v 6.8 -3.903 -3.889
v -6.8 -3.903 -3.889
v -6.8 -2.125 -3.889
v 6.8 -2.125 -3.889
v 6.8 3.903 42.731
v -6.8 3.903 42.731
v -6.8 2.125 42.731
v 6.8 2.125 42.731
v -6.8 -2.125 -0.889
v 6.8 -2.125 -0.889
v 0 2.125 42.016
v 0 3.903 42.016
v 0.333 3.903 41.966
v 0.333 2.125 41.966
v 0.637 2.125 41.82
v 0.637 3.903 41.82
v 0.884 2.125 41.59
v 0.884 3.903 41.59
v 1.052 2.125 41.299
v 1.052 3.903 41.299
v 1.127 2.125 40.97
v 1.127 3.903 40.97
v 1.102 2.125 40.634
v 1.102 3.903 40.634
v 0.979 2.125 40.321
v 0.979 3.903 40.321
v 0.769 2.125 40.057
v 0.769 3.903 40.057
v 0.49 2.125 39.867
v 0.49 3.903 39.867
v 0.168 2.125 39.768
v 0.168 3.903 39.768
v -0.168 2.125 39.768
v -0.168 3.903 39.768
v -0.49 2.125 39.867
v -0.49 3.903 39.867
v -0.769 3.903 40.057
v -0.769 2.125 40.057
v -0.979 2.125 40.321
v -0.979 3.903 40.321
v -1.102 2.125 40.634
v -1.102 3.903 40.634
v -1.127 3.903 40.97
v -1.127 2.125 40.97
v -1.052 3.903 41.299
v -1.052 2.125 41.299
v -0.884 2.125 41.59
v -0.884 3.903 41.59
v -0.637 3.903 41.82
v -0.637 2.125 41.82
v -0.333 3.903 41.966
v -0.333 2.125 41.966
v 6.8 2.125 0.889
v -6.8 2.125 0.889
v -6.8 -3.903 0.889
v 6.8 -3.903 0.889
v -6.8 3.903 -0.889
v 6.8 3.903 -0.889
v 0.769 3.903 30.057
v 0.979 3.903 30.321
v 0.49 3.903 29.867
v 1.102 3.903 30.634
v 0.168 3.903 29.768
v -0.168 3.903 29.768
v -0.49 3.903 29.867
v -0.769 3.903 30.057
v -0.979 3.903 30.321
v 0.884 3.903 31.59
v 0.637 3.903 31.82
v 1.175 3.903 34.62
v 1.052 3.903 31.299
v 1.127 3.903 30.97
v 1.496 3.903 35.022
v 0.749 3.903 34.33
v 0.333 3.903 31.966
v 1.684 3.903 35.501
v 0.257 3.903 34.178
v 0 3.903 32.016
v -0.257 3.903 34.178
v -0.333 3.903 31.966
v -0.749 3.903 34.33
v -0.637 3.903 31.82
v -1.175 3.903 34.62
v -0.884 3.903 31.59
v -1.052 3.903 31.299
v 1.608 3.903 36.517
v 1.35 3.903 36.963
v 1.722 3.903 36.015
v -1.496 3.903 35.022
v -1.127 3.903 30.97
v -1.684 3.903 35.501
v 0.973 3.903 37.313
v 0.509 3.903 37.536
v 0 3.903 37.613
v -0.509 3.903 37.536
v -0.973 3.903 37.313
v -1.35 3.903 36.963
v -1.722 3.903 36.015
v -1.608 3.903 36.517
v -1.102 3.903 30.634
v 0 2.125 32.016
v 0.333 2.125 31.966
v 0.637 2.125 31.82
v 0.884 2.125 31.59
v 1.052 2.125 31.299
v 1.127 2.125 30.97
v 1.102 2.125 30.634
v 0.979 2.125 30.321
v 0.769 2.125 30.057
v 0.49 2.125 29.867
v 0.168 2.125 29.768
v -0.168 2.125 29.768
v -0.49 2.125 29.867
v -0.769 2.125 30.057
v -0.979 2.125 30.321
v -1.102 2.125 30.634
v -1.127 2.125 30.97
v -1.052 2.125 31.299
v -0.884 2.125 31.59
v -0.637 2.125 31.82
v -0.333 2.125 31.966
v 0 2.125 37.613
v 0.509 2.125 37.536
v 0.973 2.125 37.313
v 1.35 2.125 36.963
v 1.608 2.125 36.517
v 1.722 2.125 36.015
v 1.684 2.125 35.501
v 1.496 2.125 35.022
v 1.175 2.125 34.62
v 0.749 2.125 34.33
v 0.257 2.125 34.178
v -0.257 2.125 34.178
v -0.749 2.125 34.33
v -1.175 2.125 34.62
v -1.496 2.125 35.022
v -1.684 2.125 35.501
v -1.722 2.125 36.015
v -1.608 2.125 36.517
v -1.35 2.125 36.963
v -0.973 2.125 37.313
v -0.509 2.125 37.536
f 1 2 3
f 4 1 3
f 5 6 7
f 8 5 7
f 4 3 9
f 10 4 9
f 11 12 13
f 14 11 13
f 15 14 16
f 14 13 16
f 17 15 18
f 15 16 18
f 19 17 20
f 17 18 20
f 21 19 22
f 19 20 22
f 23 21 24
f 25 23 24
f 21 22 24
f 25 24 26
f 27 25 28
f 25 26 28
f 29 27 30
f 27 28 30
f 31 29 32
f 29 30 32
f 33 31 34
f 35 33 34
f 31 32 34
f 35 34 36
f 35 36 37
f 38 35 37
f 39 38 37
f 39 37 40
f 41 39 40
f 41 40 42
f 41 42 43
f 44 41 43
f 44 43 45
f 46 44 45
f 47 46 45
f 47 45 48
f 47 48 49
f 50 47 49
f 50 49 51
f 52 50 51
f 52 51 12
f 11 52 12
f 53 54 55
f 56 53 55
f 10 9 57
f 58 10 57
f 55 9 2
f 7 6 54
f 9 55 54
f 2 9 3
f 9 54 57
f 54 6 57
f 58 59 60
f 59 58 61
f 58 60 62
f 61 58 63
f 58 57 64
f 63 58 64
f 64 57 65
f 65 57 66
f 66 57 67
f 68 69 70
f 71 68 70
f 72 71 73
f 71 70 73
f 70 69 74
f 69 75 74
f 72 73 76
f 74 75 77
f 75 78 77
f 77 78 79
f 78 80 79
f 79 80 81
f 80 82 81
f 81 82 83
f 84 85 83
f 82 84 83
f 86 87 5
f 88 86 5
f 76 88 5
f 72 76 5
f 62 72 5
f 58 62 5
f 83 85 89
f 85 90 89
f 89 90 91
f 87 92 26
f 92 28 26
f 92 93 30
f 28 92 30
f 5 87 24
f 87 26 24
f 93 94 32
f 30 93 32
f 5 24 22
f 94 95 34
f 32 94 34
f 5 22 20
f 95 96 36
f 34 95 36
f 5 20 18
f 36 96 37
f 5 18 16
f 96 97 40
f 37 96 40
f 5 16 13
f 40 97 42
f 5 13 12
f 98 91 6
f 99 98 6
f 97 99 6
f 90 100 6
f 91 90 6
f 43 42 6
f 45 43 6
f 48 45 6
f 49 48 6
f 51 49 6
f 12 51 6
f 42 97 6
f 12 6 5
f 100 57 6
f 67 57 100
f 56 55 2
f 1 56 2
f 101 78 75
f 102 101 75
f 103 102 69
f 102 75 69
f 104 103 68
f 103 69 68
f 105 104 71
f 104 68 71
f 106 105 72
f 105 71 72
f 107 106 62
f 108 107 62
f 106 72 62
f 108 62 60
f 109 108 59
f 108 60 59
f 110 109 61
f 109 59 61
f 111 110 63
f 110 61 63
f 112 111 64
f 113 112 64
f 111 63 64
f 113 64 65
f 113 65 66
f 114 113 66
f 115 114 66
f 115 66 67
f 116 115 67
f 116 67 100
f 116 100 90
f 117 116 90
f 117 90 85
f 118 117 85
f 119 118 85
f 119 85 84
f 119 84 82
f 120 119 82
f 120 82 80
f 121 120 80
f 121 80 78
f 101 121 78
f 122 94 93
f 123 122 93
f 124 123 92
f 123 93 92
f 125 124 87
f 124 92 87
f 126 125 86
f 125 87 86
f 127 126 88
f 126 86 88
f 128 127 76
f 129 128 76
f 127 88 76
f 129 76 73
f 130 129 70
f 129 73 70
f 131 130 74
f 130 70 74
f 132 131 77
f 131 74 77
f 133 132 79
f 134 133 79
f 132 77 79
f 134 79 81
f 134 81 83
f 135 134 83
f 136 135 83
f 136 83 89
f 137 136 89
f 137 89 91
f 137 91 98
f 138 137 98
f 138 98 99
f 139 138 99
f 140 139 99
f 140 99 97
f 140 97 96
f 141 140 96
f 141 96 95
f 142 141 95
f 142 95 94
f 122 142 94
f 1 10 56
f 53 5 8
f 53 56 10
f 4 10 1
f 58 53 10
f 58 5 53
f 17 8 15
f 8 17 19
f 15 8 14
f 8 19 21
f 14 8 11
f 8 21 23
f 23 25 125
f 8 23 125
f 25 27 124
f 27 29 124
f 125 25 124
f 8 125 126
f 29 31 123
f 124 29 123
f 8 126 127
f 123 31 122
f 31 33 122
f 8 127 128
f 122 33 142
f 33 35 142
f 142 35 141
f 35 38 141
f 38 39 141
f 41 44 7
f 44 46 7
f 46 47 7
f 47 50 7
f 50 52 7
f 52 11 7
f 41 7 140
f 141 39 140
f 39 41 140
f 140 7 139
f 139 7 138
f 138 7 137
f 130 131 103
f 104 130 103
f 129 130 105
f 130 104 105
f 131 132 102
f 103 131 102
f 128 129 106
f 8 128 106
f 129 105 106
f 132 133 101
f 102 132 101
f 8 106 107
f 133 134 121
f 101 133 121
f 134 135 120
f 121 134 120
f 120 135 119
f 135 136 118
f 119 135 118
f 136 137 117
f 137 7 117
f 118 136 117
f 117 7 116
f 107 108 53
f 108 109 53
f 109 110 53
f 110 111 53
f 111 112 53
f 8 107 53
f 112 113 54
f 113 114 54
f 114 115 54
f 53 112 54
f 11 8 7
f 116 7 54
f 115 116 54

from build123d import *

# Parameters (mm, degrees)
BOSS_EXTRUDE1_DEPTH      = 6.8
BOSS_EXTRUDE1_DEPTH_BACK = 6.8
CUT_EXTRUDE1_REACH       = 45.967
SKETCH2_R                = 1.1303
SKETCH2_R_2              = 1.7272


with BuildPart() as part:
    # Sketch1 → Boss-Extrude1 (new, two sides: drawn at the far end of the back side and taken through both)
    with BuildSketch(Plane(origin=(0, 0, 0), x_dir=(0, 0, -1), z_dir=(1, 0, 0)).offset(-BOSS_EXTRUDE1_DEPTH_BACK)):
        Polygon((0.889, 3.903), (-0.889, 3.903), (-42.731, 3.903), (-42.731, 2.125), (-0.889, 2.125), (-0.889, -3.903), (3.889, -3.903), (3.889, -2.125), (0.889, -2.125), align=None)
    extrude(amount=BOSS_EXTRUDE1_DEPTH + BOSS_EXTRUDE1_DEPTH_BACK)

    # Sketch2 → Cut-Extrude1 (cut, up to next)
    with BuildSketch(Plane(origin=(0, 3.903, 0), x_dir=(1, 0, 0), z_dir=(0, 1, 0)), mode=Mode.PRIVATE) as cut_extrude1_sk1:
        with Locations((0, -40.8857)):
            Circle(SKETCH2_R)
    cut_extrude1_tool1 = extrude(cut_extrude1_sk1.sketch, amount=-CUT_EXTRUDE1_REACH, mode=Mode.PRIVATE) & part.part
    # Sketch2 → Cut-Extrude1 (cut, up to next)
    with BuildSketch(Plane(origin=(0, 3.903, 0), x_dir=(1, 0, 0), z_dir=(0, 1, 0)), mode=Mode.PRIVATE) as cut_extrude1_sk2:
        with Locations((0, -35.8857)):
            Circle(SKETCH2_R_2)
    cut_extrude1_tool2 = extrude(cut_extrude1_sk2.sketch, amount=-CUT_EXTRUDE1_REACH, mode=Mode.PRIVATE) & part.part
    # Sketch2 → Cut-Extrude1 (cut, up to next)
    with BuildSketch(Plane(origin=(0, 3.903, 0), x_dir=(1, 0, 0), z_dir=(0, 1, 0)), mode=Mode.PRIVATE) as cut_extrude1_sk3:
        with Locations((0, -30.8857)):
            Circle(SKETCH2_R)
    cut_extrude1_tool3 = extrude(cut_extrude1_sk3.sketch, amount=-CUT_EXTRUDE1_REACH, mode=Mode.PRIVATE) & part.part
    add(cut_extrude1_tool1.solids().sort_by_distance((0, 3.903, 40.8857))[0], mode=Mode.SUBTRACT)
    add(cut_extrude1_tool2.solids().sort_by_distance((0, 3.903, 35.8857))[0], mode=Mode.SUBTRACT)
    add(cut_extrude1_tool3.solids().sort_by_distance((0, 3.903, 30.8857))[0], mode=Mode.SUBTRACT)


solid = part.part
